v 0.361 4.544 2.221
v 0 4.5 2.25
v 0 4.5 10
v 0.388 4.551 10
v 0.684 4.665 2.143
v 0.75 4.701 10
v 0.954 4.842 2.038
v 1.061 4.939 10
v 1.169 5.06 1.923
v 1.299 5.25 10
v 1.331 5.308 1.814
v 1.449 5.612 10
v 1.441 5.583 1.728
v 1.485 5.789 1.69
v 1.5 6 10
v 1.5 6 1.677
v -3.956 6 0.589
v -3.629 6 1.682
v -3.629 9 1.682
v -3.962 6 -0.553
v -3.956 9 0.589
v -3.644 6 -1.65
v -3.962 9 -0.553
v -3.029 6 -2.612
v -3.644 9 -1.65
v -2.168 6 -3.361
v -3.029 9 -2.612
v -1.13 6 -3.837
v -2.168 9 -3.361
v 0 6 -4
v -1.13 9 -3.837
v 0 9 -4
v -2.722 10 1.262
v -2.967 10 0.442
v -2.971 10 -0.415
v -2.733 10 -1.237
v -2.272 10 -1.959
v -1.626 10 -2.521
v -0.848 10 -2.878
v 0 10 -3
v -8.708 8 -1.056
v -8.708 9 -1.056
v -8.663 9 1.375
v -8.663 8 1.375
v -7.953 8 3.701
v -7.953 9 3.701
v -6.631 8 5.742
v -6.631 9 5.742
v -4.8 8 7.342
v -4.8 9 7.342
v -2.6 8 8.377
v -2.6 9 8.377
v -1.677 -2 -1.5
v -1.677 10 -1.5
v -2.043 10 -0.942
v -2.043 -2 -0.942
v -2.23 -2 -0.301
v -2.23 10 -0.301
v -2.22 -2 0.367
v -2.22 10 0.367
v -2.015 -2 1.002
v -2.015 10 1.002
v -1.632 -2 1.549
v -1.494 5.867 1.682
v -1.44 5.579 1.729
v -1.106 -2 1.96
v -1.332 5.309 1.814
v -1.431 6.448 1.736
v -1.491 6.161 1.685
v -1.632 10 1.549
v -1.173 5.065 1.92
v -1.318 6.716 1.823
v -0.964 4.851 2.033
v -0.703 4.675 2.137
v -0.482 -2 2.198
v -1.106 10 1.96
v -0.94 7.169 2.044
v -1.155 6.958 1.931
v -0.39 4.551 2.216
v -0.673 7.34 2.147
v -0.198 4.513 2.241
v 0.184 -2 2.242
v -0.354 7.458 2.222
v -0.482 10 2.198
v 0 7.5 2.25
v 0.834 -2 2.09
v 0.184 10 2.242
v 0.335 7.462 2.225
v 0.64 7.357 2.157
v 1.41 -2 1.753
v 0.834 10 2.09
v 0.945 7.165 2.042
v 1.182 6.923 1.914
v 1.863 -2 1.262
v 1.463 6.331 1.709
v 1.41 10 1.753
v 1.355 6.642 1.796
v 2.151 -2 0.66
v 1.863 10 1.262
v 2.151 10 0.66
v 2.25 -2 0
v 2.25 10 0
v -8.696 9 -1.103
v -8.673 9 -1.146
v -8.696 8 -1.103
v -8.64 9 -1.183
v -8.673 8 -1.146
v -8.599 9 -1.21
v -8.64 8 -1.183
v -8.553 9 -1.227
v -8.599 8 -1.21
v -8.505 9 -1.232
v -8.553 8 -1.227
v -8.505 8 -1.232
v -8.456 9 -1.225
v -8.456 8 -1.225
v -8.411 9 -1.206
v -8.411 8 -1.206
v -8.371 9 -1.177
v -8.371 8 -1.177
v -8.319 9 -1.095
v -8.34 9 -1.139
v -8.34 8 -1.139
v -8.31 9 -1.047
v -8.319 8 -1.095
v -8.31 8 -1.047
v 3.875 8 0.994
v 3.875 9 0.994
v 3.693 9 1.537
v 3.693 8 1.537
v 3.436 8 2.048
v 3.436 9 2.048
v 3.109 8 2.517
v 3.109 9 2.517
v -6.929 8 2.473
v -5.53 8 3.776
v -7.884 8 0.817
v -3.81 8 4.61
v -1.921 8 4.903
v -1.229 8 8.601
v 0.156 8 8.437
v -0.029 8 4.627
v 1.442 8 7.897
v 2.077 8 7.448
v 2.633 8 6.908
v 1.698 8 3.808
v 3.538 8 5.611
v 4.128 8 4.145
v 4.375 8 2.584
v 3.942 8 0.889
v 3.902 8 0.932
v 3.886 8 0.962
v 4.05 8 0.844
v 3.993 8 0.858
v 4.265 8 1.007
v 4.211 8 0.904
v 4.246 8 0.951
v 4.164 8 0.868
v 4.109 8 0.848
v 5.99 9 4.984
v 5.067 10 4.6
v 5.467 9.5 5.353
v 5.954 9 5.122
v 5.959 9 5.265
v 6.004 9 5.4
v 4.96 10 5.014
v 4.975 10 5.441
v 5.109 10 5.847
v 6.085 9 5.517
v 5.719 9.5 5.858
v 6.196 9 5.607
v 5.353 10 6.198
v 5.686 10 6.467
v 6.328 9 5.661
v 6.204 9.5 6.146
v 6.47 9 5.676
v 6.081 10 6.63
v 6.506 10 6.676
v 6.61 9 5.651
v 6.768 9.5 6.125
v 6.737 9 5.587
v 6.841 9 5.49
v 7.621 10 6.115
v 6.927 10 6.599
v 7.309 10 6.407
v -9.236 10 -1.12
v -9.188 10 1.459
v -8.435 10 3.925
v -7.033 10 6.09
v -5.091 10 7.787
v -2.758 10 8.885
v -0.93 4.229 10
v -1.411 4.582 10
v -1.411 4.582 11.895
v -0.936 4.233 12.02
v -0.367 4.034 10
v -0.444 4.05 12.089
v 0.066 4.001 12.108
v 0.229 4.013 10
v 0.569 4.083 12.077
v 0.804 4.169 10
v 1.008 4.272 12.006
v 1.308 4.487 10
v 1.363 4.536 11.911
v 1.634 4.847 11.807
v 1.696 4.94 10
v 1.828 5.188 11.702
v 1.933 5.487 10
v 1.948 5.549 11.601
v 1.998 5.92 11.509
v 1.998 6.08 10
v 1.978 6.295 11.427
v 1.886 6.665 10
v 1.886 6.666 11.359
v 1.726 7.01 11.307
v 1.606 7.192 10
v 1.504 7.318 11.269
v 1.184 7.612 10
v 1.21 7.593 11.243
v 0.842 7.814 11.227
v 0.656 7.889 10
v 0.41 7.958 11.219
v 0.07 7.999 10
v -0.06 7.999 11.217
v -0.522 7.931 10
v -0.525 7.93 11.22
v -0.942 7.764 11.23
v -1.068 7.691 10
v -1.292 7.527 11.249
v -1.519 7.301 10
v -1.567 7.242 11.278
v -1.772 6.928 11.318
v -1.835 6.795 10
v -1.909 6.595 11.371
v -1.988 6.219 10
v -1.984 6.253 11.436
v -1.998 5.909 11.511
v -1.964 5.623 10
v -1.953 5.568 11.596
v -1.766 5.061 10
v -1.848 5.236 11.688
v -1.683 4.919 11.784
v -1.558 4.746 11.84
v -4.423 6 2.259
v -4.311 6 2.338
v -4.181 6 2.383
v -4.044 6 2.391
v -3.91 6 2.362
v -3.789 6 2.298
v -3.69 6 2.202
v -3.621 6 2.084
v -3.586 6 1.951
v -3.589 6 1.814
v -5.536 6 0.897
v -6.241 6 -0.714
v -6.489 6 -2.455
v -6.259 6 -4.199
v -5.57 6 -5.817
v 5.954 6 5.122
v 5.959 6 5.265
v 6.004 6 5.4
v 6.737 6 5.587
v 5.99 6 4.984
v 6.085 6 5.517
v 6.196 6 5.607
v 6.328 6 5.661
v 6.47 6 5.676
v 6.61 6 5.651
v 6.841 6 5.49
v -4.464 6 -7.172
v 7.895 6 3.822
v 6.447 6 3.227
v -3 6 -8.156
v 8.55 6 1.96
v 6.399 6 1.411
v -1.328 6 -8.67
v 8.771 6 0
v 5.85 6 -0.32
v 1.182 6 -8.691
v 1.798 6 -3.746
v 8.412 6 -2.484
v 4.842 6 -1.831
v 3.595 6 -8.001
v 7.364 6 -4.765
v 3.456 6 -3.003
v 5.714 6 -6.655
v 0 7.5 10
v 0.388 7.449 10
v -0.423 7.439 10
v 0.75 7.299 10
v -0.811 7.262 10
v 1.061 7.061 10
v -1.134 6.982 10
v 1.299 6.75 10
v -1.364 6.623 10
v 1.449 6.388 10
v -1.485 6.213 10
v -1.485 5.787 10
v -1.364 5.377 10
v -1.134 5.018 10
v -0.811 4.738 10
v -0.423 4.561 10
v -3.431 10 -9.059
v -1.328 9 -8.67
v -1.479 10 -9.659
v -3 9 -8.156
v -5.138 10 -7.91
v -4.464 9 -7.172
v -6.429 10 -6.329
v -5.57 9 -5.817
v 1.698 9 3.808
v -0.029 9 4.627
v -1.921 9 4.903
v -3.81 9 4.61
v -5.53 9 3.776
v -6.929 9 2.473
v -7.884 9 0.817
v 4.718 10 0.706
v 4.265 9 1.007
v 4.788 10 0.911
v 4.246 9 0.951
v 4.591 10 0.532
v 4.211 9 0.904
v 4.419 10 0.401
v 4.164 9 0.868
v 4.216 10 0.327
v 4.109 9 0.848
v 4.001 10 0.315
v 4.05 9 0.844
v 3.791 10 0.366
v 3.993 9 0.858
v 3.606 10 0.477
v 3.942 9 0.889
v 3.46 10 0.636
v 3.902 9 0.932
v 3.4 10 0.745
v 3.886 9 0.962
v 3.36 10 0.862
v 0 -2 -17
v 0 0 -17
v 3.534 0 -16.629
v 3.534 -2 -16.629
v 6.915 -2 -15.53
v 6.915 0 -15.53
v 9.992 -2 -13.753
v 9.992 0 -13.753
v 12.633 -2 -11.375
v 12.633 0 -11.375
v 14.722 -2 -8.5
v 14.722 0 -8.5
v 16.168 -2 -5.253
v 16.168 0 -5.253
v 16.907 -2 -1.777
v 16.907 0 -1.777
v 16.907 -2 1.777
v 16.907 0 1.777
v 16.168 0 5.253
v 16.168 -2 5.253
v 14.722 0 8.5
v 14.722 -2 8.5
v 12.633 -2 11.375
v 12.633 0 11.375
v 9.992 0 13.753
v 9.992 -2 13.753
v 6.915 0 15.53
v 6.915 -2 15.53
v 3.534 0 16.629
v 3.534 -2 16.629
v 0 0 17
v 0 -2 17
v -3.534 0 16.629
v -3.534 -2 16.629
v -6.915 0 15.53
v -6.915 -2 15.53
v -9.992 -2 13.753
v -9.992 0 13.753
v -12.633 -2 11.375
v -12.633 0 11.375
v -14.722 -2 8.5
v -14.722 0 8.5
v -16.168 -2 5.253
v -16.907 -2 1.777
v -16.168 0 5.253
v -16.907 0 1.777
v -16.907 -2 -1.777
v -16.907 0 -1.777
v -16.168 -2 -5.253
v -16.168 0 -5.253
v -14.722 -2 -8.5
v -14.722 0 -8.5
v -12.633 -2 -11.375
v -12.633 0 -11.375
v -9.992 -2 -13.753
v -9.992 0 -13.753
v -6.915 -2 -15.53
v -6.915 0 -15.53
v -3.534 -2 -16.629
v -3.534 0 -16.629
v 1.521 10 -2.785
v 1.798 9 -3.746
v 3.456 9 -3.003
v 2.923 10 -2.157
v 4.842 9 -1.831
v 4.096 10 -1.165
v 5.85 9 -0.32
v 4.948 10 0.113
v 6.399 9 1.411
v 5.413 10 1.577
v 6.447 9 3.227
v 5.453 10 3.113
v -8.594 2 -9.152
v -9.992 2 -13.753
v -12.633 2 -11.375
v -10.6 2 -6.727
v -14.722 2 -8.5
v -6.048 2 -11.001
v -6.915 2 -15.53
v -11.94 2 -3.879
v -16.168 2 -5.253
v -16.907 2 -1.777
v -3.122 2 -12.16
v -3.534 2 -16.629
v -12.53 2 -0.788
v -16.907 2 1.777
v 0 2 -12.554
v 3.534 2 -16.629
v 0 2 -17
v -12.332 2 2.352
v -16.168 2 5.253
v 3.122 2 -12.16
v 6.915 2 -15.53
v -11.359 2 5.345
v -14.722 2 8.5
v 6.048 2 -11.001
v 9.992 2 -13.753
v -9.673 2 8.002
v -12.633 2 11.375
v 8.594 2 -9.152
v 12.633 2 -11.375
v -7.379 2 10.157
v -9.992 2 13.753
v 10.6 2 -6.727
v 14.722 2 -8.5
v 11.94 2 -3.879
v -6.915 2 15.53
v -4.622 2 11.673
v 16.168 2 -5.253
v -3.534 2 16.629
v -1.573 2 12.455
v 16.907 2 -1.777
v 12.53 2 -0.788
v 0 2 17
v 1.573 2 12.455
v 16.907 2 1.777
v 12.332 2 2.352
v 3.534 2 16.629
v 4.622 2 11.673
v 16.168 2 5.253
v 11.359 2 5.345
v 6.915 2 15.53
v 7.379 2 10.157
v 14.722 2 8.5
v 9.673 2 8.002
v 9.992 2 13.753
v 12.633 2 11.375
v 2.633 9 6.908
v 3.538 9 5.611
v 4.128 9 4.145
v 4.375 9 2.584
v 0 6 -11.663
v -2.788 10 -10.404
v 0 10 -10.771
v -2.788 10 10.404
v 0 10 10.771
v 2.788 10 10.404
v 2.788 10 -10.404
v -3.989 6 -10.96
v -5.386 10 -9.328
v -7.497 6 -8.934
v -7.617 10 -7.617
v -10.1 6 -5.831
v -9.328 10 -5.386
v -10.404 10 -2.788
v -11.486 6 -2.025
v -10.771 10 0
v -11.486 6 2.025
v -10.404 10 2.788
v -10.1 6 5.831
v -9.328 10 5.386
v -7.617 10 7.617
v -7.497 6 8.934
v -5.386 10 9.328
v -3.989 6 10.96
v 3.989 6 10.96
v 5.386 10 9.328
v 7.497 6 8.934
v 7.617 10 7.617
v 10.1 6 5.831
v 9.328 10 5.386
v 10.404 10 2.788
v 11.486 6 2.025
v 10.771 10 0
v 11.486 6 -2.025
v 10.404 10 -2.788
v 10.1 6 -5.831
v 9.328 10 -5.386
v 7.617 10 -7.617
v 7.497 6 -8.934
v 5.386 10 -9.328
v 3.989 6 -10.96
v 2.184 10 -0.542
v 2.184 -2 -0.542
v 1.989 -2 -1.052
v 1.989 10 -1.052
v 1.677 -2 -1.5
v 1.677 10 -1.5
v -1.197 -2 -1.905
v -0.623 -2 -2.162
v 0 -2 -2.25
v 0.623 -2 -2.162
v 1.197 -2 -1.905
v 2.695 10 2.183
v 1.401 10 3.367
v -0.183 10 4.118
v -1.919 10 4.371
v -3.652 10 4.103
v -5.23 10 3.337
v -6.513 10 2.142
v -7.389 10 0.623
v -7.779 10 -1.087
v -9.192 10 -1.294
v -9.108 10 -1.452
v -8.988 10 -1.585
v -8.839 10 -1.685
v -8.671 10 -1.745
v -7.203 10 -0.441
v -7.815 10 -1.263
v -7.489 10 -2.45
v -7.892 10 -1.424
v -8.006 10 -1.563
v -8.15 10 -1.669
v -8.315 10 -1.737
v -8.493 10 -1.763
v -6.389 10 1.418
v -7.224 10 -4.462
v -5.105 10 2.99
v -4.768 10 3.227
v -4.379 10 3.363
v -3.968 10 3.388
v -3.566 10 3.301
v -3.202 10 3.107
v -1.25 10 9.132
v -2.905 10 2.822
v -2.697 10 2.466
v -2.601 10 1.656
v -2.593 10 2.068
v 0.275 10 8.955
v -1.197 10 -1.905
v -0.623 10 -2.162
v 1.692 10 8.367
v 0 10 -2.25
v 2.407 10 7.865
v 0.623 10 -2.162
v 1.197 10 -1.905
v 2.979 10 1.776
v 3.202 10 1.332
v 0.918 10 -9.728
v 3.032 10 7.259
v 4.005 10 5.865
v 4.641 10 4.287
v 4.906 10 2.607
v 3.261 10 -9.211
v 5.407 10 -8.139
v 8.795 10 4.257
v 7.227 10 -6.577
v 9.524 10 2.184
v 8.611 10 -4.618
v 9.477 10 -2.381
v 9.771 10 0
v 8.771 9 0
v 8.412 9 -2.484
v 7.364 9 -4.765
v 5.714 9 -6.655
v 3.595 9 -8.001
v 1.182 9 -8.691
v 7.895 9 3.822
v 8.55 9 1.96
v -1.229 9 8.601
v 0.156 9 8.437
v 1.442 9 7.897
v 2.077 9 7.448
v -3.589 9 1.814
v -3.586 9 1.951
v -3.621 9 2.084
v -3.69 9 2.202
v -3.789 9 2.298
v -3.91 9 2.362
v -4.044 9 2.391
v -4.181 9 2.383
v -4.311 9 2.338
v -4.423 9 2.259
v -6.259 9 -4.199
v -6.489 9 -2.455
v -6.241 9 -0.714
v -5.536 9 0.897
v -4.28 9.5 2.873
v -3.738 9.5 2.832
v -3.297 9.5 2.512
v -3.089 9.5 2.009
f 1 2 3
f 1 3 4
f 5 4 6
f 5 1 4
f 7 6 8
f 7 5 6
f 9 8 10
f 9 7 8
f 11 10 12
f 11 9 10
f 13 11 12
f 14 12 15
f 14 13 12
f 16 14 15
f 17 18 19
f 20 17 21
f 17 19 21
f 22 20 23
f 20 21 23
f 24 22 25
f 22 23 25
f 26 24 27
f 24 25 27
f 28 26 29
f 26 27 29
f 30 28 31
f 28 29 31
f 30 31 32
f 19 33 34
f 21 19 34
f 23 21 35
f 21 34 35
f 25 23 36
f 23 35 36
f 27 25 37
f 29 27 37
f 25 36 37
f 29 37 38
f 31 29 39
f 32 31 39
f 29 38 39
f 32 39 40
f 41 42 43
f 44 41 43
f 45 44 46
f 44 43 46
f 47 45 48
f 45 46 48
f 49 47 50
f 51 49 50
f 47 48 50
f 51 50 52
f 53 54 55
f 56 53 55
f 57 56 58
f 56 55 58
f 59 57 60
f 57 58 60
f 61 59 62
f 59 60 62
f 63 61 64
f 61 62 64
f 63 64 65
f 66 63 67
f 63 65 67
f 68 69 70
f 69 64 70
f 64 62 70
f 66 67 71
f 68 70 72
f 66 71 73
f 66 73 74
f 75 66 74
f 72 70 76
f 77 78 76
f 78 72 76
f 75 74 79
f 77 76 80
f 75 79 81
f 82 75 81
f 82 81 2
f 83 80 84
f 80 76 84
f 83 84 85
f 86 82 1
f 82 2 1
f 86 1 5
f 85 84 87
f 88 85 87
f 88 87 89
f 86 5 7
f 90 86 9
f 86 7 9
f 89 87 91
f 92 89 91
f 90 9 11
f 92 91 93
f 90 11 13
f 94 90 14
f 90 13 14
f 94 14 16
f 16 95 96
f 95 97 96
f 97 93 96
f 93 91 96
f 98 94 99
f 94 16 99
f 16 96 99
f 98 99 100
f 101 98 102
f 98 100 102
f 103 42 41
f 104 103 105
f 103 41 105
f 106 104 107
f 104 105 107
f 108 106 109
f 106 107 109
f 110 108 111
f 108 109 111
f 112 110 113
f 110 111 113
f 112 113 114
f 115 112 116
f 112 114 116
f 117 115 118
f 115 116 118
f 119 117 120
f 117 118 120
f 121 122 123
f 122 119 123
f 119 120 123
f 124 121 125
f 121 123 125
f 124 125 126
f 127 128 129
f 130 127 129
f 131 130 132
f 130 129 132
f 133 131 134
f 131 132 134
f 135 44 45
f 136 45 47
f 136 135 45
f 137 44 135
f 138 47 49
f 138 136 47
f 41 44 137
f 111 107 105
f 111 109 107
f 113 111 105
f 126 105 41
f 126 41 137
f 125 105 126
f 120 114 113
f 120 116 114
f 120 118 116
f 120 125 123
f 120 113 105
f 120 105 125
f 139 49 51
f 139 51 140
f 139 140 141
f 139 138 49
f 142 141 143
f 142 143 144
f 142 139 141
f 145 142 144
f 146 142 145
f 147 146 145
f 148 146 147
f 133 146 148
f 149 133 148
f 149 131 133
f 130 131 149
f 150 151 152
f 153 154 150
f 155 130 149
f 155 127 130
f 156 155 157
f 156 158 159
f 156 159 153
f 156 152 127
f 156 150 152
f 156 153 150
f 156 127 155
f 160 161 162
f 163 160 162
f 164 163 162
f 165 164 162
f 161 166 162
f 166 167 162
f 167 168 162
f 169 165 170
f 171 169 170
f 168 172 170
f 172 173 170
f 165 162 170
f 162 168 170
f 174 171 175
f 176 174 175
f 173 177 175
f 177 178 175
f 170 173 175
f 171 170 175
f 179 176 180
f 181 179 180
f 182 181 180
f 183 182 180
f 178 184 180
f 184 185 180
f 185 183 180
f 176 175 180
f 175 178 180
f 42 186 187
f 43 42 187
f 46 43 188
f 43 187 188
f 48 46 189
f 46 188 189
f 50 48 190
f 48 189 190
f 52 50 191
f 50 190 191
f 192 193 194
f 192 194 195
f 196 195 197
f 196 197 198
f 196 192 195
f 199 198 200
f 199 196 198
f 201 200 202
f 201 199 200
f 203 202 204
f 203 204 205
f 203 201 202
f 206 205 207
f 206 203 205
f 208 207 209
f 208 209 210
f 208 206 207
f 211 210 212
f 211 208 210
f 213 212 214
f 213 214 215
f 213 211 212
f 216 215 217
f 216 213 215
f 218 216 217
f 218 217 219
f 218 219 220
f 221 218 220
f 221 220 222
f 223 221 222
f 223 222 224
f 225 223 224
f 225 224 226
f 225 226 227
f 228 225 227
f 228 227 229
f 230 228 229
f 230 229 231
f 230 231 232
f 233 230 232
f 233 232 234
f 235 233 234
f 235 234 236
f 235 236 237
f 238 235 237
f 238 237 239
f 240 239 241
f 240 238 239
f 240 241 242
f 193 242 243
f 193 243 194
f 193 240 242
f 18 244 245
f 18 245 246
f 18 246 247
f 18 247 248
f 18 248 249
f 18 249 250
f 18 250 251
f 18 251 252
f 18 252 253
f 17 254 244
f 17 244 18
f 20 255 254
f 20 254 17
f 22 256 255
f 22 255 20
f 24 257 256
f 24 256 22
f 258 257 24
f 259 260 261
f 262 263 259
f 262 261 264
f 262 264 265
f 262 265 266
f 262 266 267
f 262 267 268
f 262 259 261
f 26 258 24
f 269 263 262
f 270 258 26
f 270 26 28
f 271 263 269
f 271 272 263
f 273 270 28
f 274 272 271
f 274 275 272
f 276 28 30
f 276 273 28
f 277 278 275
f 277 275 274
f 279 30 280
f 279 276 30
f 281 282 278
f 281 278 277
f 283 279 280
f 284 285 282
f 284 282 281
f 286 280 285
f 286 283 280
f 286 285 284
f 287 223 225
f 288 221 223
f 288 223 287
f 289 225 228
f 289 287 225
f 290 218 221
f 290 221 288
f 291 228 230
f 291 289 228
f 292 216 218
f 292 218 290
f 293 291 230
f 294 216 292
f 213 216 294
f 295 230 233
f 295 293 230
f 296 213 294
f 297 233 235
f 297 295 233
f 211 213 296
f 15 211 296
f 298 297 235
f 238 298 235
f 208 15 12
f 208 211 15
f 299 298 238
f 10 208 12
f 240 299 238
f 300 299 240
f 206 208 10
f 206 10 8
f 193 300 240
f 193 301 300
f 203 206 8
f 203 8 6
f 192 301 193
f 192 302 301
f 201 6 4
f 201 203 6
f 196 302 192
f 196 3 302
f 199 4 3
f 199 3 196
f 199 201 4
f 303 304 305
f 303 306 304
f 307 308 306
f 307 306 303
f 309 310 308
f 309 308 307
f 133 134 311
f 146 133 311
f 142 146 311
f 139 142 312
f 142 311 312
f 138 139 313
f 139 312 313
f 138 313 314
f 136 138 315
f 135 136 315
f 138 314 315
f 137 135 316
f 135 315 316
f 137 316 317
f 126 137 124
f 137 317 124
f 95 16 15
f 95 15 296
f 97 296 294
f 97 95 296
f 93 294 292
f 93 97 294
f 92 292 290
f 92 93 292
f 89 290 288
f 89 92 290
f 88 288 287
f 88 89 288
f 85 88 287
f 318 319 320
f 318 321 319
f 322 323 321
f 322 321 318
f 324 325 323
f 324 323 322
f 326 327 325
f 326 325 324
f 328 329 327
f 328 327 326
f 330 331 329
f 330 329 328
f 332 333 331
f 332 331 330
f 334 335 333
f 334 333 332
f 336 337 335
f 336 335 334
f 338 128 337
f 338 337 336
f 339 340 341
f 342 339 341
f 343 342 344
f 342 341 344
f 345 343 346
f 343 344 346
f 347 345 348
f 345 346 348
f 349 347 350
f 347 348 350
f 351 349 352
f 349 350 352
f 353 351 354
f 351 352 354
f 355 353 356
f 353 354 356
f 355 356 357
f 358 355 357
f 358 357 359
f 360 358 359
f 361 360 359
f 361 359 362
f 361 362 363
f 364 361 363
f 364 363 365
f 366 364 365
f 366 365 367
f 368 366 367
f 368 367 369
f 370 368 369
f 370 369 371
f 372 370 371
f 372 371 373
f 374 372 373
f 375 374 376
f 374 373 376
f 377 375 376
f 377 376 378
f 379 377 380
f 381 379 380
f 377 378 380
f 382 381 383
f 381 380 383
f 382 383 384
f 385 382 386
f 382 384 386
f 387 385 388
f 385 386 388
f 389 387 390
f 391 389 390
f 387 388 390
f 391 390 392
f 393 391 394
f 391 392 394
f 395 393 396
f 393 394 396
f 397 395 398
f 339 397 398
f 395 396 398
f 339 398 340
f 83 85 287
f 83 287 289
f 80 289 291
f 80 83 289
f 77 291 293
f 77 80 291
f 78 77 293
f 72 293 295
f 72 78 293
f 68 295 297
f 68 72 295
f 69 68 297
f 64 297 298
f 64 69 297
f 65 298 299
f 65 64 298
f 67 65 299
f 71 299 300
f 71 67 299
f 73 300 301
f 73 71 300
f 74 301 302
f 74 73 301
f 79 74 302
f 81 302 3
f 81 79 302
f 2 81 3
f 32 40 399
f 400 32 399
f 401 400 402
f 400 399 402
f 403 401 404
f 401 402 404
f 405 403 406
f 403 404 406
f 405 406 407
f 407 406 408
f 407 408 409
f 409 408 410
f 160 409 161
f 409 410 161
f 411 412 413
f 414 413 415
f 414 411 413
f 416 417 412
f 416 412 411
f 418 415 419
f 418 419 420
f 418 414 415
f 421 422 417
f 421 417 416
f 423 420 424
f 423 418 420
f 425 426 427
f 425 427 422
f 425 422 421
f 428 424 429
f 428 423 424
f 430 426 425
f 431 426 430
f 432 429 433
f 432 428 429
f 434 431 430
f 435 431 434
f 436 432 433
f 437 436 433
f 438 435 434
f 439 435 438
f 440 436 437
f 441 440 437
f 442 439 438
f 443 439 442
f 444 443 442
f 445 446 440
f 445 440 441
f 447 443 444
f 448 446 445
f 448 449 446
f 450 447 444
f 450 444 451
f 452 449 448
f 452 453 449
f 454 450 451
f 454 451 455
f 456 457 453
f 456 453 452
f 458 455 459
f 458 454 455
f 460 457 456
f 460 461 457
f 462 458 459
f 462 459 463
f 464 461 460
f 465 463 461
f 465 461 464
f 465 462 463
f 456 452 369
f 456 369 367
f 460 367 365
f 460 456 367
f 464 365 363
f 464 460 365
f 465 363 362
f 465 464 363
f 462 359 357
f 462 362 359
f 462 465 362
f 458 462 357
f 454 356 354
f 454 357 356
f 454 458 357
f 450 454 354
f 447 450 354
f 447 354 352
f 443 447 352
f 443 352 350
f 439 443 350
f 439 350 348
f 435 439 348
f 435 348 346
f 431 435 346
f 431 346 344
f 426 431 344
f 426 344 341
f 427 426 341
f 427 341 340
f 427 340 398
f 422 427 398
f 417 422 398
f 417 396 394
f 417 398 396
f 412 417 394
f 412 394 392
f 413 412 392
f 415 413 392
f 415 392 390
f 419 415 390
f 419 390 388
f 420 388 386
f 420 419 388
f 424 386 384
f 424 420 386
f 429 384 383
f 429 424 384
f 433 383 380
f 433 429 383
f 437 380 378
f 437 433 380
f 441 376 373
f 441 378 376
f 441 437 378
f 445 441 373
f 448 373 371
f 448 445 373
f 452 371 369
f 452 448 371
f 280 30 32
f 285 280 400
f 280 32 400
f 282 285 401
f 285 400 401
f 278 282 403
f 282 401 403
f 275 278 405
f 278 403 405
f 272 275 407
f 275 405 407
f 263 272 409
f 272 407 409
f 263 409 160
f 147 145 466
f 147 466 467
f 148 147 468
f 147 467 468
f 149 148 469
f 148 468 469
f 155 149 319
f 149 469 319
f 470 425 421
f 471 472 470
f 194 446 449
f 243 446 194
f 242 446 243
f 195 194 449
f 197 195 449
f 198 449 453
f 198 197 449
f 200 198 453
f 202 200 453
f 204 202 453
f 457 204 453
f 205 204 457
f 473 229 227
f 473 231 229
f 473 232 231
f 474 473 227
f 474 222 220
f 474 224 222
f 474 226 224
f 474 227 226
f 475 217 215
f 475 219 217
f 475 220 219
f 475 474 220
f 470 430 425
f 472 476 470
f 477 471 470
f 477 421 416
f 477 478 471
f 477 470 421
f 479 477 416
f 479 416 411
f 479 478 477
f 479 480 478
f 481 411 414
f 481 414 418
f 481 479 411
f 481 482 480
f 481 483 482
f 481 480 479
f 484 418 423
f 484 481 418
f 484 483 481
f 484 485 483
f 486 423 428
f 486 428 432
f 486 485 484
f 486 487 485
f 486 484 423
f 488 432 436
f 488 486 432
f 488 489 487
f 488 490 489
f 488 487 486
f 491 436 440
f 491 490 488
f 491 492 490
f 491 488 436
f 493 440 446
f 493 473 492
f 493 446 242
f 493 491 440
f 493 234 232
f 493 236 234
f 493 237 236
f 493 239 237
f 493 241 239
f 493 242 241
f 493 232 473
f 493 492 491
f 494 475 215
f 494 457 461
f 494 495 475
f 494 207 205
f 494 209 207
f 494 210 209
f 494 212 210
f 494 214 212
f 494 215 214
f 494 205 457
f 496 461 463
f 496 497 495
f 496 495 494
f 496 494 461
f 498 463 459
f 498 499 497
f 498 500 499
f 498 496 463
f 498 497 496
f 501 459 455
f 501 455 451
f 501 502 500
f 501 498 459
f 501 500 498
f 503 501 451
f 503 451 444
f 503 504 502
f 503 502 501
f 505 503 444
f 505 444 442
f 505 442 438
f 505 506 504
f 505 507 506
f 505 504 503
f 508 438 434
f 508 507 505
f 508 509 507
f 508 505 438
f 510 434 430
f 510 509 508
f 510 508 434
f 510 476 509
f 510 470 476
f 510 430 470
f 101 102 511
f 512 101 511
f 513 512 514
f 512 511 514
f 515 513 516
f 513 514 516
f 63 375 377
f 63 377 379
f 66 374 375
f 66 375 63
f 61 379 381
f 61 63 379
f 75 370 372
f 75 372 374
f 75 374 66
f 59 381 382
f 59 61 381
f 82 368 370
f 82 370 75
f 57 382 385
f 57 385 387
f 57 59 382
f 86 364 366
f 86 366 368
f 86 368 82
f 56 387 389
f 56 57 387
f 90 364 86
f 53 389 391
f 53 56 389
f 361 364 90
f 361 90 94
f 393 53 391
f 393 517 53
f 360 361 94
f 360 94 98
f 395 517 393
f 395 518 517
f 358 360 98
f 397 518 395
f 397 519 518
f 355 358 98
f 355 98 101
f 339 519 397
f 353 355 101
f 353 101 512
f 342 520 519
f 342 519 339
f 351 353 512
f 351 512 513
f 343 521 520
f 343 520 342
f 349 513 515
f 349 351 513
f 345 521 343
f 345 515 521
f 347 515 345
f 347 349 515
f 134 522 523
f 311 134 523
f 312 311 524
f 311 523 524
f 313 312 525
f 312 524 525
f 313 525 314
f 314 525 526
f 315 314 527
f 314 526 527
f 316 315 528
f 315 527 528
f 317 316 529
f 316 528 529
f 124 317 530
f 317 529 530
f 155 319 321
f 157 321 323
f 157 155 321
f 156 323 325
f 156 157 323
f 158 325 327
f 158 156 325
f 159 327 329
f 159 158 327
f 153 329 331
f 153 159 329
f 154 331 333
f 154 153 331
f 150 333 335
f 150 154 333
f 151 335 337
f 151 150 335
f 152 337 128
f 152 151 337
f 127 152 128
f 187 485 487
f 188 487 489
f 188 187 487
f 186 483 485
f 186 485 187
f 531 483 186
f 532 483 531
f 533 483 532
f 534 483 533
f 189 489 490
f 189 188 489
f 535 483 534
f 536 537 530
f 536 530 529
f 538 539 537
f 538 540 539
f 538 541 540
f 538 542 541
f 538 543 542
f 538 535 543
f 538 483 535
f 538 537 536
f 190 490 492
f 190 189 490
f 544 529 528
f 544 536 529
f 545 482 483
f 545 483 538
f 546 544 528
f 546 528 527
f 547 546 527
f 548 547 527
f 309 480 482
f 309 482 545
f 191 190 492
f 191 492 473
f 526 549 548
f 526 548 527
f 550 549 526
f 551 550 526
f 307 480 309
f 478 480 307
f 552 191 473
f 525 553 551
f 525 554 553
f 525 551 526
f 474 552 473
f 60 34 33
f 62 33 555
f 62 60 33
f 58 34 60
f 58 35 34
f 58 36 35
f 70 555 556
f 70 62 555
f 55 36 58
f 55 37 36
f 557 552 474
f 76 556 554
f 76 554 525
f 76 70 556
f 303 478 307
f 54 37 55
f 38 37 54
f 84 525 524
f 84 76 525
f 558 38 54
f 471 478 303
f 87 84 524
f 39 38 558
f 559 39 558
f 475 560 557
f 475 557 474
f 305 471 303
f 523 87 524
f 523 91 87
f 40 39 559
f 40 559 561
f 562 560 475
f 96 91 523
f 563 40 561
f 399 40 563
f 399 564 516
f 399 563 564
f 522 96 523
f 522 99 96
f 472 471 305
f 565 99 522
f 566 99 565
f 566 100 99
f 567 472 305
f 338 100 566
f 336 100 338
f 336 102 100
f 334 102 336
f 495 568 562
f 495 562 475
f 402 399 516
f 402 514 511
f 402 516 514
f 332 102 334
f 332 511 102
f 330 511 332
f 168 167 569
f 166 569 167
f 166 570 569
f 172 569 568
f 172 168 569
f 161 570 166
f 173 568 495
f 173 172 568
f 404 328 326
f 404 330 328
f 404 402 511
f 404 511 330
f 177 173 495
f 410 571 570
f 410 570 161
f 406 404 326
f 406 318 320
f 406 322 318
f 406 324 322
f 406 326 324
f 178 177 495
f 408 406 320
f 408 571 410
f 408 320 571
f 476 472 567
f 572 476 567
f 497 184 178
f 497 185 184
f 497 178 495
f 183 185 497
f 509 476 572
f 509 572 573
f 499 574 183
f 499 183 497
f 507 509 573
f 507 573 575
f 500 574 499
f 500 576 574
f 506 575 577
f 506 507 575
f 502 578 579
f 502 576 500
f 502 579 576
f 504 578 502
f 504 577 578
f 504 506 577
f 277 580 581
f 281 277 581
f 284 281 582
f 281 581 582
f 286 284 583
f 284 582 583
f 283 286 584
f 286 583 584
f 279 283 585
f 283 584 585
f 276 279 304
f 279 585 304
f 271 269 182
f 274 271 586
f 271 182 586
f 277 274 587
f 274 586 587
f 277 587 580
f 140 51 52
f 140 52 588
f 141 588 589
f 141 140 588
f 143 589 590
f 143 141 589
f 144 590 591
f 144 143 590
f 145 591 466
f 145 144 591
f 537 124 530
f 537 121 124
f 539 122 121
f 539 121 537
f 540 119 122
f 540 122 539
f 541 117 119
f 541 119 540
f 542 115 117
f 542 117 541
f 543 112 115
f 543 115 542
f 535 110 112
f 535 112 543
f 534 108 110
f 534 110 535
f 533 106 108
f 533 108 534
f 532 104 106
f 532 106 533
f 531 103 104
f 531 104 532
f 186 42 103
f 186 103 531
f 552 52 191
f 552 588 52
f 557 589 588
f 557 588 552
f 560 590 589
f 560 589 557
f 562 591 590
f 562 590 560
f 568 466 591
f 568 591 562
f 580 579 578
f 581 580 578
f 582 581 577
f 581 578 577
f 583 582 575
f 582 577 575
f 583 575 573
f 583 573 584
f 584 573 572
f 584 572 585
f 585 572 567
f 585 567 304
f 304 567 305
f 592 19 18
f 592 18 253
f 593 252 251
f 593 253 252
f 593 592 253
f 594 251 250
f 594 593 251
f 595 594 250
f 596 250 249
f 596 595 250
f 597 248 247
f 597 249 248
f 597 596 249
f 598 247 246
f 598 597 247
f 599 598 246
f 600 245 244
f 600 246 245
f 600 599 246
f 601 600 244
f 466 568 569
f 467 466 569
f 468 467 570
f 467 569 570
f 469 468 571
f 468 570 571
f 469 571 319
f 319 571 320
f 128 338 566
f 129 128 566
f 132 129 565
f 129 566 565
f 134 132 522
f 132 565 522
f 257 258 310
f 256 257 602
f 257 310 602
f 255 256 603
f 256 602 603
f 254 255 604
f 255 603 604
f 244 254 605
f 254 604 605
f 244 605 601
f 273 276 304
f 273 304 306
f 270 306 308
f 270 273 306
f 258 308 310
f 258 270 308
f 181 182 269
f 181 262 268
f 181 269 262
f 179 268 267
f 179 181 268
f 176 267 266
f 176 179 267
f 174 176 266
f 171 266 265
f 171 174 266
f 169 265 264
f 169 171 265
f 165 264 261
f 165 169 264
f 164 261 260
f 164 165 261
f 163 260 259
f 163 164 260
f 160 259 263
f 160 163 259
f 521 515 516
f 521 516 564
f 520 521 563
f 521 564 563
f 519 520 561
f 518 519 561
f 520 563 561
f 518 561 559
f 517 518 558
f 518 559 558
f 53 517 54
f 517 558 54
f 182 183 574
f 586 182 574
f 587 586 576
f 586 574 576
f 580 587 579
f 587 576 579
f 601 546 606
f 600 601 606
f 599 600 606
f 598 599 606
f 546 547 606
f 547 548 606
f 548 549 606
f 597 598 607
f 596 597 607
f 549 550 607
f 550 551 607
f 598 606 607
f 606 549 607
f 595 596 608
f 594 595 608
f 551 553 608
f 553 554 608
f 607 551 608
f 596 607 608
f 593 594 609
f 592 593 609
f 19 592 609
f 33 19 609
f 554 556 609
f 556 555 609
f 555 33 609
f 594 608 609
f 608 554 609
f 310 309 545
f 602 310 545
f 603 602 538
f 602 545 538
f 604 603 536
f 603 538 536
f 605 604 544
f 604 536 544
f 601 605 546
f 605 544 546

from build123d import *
from OCP.BRepFilletAPI import BRepFilletAPI_MakeChamfer

# Parameters (mm, degrees)
SKETCH1_R               = 13
BOSS_EXTRUDE1_DEPTH     = 10
SKETCH3_R               = 17
BOSS_EXTRUDE2_DEPTH     = 2
F_4_MM_SHAFT_HOLE_DEPTH = 27.870057685
BOSS_EXTRUDE3_START     = 2
SKETCH9_R               = 17
SKETCH9_R_2             = 2.25
BOSS_EXTRUDE3_DEPTH     = 2
CUT_EXTRUDE3_DEPTH      = 27.038433133
CUT_EXTRUDE4_START      = 10
SKETCH10_3_R            = 2
SKETCH10_3_R_2          = 1.5
CUT_EXTRUDE4_DEPTH      = 17.038433171
CUT_EXTRUDE5_DEPTH      = 4
FILLET3_R               = 6
FILLET4_R               = 0.5
CHAMFER1_SIZE           = 1
CUT_EXTRUDE7_DEPTH      = 2
FILLET6_R               = 5
FILLET8_R               = 0.2
CHAMFER3_SIZE           = 1
CHAMFER3_SIZE2          = 0.531709432


with BuildPart() as part:
    # Sketch1 → Boss-Extrude1 (new body)
    with BuildSketch(Plane(origin=(0, 0, 0), x_dir=(1, 0, 0), z_dir=(0, 1, 0))):
        with Locations(Location((0, 0, 0), (0, 0, 270))):
            Circle(SKETCH1_R)
    extrude(amount=BOSS_EXTRUDE1_DEPTH)

    # Sketch2 → Cut-Revolve1 (revolve, cut)
    with BuildSketch(Plane(origin=(0, 0, 0), x_dir=(0, 0, -1), z_dir=(1, 0, 0)), mode=Mode.PRIVATE) as cut_revolve1_sk:
        Polygon((-13, 0), (-10.771428571, 10), (-13, 10), align=None)
    revolve(cut_revolve1_sk.sketch.rotate(Axis((0, 0, 0), (0, 1, 0)), 180), axis=Axis((0, 0, 0), (0, 1, 0)), mode=Mode.SUBTRACT)

    # Sketch3 → Boss-Extrude2 (add)
    with BuildSketch(Plane(origin=(0, 0, 0), x_dir=(-1, 0, 0), z_dir=(0, -1, 0))):
        with Locations(Location((0, 0, 0), (0, 0, 90))):
            Circle(SKETCH3_R)
    extrude(amount=BOSS_EXTRUDE2_DEPTH)

    # Sketch5 → 4-mm shaft hole (cut, through all)
    with BuildSketch(Plane(origin=(0, 10, 0), x_dir=(1, 0, 0), z_dir=(0, 1, 0))):
        with BuildLine():
            ThreePointArc((1.677050983, 1.5), (0, 2.25), (-1.677050983, 1.5))
            Line((-1.677050983, 1.5), (1.677050983, 1.5))
        make_face()
        with BuildLine():
            Line((1.677050983, 1.5), (-1.677050983, 1.5))
            ThreePointArc((-1.677050983, 1.5), (-0.802849702, -2.101887808), (2.25, 0))
            ThreePointArc((2.25, 0), (2.101887808, 0.802849702), (1.677050983, 1.5))
        make_face()
    extrude(amount=-F_4_MM_SHAFT_HOLE_DEPTH, mode=Mode.SUBTRACT)

    # Sketch9 → Boss-Extrude3 (add)
    with BuildSketch(Plane(origin=(0, 0, 0), x_dir=(1, 0, 0), z_dir=(0, 1, 0)).offset(BOSS_EXTRUDE3_START)):
        with Locations(Location((0, 0, 0), (0, 0, 270))):
            Circle(SKETCH9_R)
        with Locations(Location((0, 0, 0), (0, 0, 270))):
            Circle(SKETCH9_R_2, mode=Mode.SUBTRACT)
    extrude(amount=-BOSS_EXTRUDE3_DEPTH)

    # Sketch10 → Cut-Extrude3 (cut, through all)
    with BuildSketch(Plane.XY):
        with BuildLine():
            ThreePointArc((0, 7.5), (-1.5, 6), (0, 4.5))
            Line((0, 4.5), (0, 7.5))
        make_face()
        with BuildLine():
            Line((0, 7.5), (0, 4.5))
            ThreePointArc((0, 4.5), (1.060660172, 4.939339828), (1.5, 6))
            ThreePointArc((1.5, 6), (1.060660172, 7.060660172), (0, 7.5))
        make_face()
    extrude(amount=CUT_EXTRUDE3_DEPTH, mode=Mode.SUBTRACT)

    # Sketch10<3> → Cut-Extrude4 (cut, through all)
    with BuildSketch(Plane.XY.offset(CUT_EXTRUDE4_START)):
        with Locations(Location((0, 6, 0), (0, 0, 225.143578884))):
            Circle(SKETCH10_3_R)
        with Locations(Location((0, 6, 0), (0, 0, 270))):
            Circle(SKETCH10_3_R_2, mode=Mode.SUBTRACT)
    extrude(amount=CUT_EXTRUDE4_DEPTH, mode=Mode.SUBTRACT)

    # Sketch11 → Cut-Extrude5 (cut)
    with BuildSketch(Plane(origin=(0, 10, 0), x_dir=(1, 0, 0), z_dir=(0, 1, 0))):
        with BuildLine():
            ThreePointArc((3, -8.242448615), (7.185132041, -5.031087033), (8.771428571, 0))
            ThreePointArc((8.771428571, 0), (5.031087033, 7.185132041), (-3, 8.242448615))
            ThreePointArc((-3, 8.242448615), (-6.302331872, 0.944417603), (0, -4))
            ThreePointArc((0, -4), (-4, 0), (0, 4))
            ThreePointArc((0, 4), (6.302331872, -0.944417603), (3, -8.242448615))
        make_face()
    extrude(amount=-CUT_EXTRUDE5_DEPTH, mode=Mode.SUBTRACT)

    # Fillet3
    fillet3_edges = [part.edges().sort_by_distance(p)[0] for p in [
        (-3, 8, -8.242448615),
    ]]
    fillet(fillet3_edges, radius=FILLET3_R)

    # Fillet4
    # the kernel refuses this fillet: 0.5 mm, written as the material it adds along each edge
    with BuildSketch(Plane(origin=(3, 10, 8.242448615), x_dir=(0.676109910174844, 0, -0.7368007799692969), z_dir=(0, -1, 0))) as fillet4_piece_1_section:
        with BuildLine():
            CenterArc((4.592297125, 0.470079575), FILLET4_R, 86.204134404, 163.874166307)
            ThreePointArc((4.625398075, 0.968982699), (2.246212442, 0.801862309), (0, 0))
            ThreePointArc((0, 0), (2.210964653, 0.38829518), (4.421929307, 0))
        make_face()
    fillet4_piece_1 = extrude(amount=15.814513008, mode=Mode.PRIVATE)
    fillet4_piece_1 = split(fillet4_piece_1, bisect_by=Plane(origin=(5.361441464, -2, 6.517574012), z_dir=(0, 1, 0)), keep=Keep.TOP, mode=Mode.PRIVATE)
    add(fillet4_piece_1)
    with BuildSketch(Plane(origin=(0, 10, 4), x_dir=(-0.8427994583990877, 0, -0.5382277147473964), z_dir=(0, -1, 0))) as fillet4_piece_2_section:
        with BuildLine():
            CenterArc((4.574935575, -0.421399729), FILLET4_R, 122.563073018, 157.850467981)
            ThreePointArc((4.665311372, -0.913164119), (2.246019142, -0.899203979), (0, 0))
            ThreePointArc((0, 0), (2.152910859, -0.628802166), (4.305821718, 0))
        make_face()
    fillet4_piece_2 = extrude(amount=14.384601093, mode=Mode.PRIVATE)
    fillet4_piece_2 = fillet4_piece_2 - Plane(origin=(0, 6, 2.911656579), x_dir=(0, 1, 0), z_dir=(0, 0, -1)) * Cylinder(1.5, 48, mode=Mode.PRIVATE)
    fillet4_piece_2 = split(fillet4_piece_2, bisect_by=Plane(origin=(-3.011239117, -2, 2.911656579), z_dir=(0, 1, 0)), keep=Keep.TOP, mode=Mode.PRIVATE)
    add(fillet4_piece_2)

    # Chamfer1
    chamfer1_edges = [part.edges().sort_by_distance(p)[0] for p in [
        (-3.371197834, 10, -2.152910859),
        (5.398969594, 10, -1.110594427),
        (-3.768481471, 10, -7.717945042),
        (7.597652385, 10, -4.383336334),
        (-6.424305098, 10, -1.576218344),
        (6.196119079, 10, 5.606673983),
        (-3.789032474, 10, 2.297570227),
    ]]
    chamfer(chamfer1_edges, length=CHAMFER1_SIZE)

    # Sketch14 → Cut-Extrude7 (cut)
    with BuildSketch(Plane(origin=(0, 10, 0), x_dir=(1, 0, 0), z_dir=(0, 1, 0))):
        with BuildLine():
            ThreePointArc((3.108583846, -2.517281564), (-5.049231929, -4.075420571), (-7.949614017, 3.706965896))
            ThreePointArc((-7.949614017, 3.706965896), (-7.397747824, -4.712885136), (0, -8.771428571))
            ThreePointArc((0, -8.771428571), (3.750591207, -5.184029494), (4, 0))
            ThreePointArc((4, 0), (3.770565964, -1.335227437), (3.108583846, -2.517281564))
        make_face()
    extrude(amount=-CUT_EXTRUDE7_DEPTH, mode=Mode.SUBTRACT)

    # Fillet6
    fillet6_edges = [part.edges().sort_by_distance(p)[0] for p in [
        (0, 9, 8.771428571),
    ]]
    fillet(fillet6_edges, radius=FILLET6_R)

    # Fillet8
    fillet8_edges = [part.edges().sort_by_distance(p)[0] for p in [
        (4, 9, 0),
        (-7.949614017, 9, -3.706965896),
    ]]
    fillet(fillet8_edges, radius=FILLET8_R)

    # Chamfer3: one chamfer whose edges measure the first distance from different faces: ONE call of the kernel's chamfer builder (chamfer() names one face for all edges)
    chamfer3_edges_1 = [part.edges().sort_by_distance(p)[0] for p in [
        (3.573698882, 10, 1.796851775),
    ]]
    chamfer3_side_1 = [part.faces().sort_by_distance(p)[0] for p in [
        (3.573698882, 9, 1.796851775),
    ]]
    chamfer3_edges_2 = [part.edges().sort_by_distance(p)[0] for p in [
        (-3.810129446, 10, 4.610453161),
    ]]
    chamfer3_side_2 = [part.faces().sort_by_distance(p)[0] for p in [
        (-3.810129446, 9, 4.610453161),
    ]]
    chamfer3_edges_3 = [part.edges().sort_by_distance(p)[0] for p in [
        (0.233729709, 10, 8.415761951),
    ]]
    chamfer3_side_3 = [part.faces().sort_by_distance(p)[0] for p in [
        (0.233729709, 9, 8.415761951),
    ]]
    chamfer3_edges_4 = [part.edges().sort_by_distance(p)[0] for p in [
        (-7.362823163, 10, 4.767262763),
    ]]
    chamfer3_side_4 = [part.faces().sort_by_distance(p)[0] for p in [
        (-7.362823163, 9, 4.767262763),
    ]]
    chamfer3_edges_5 = [part.edges().sort_by_distance(p)[0] for p in [
        (4.128369515, 10, 4.145305416),
    ]]
    chamfer3_side_5 = [part.faces().sort_by_distance(p)[0] for p in [
        (4.128369515, 9, 4.145305416),
    ]]
    chamfer3_edges_6 = [part.edges().sort_by_distance(p)[0] for p in [
        (-8.504611001, 10, -1.231596345),
    ]]
    chamfer3_side_6 = [part.faces().sort_by_distance(p)[0] for p in [
        (-8.504611001, 9, -1.231596345),
    ]]
    chamfer3_edges_7 = [part.edges().sort_by_distance(p)[0] for p in [
        (4.075125782, 10, 0.843648275),
    ]]
    chamfer3_side_7 = [part.faces().sort_by_distance(p)[0] for p in [
        (4.075125783, 9, 0.843648274),
    ]]
    chamfer3 = BRepFilletAPI_MakeChamfer(part.part.solid().wrapped)
    for e in chamfer3_edges_1:
        chamfer3.Add(CHAMFER3_SIZE, CHAMFER3_SIZE2, e.wrapped, chamfer3_side_1[0].wrapped)  # the first distance lies on this face
    for e in chamfer3_edges_2:
        chamfer3.Add(CHAMFER3_SIZE, CHAMFER3_SIZE2, e.wrapped, chamfer3_side_2[0].wrapped)  # the first distance lies on this face
    for e in chamfer3_edges_3:
        chamfer3.Add(CHAMFER3_SIZE, CHAMFER3_SIZE2, e.wrapped, chamfer3_side_3[0].wrapped)  # the first distance lies on this face
    for e in chamfer3_edges_4:
        chamfer3.Add(CHAMFER3_SIZE, CHAMFER3_SIZE2, e.wrapped, chamfer3_side_4[0].wrapped)  # the first distance lies on this face
    for e in chamfer3_edges_5:
        chamfer3.Add(CHAMFER3_SIZE, CHAMFER3_SIZE2, e.wrapped, chamfer3_side_5[0].wrapped)  # the first distance lies on this face
    for e in chamfer3_edges_6:
        chamfer3.Add(CHAMFER3_SIZE, CHAMFER3_SIZE2, e.wrapped, chamfer3_side_6[0].wrapped)  # the first distance lies on this face
    for e in chamfer3_edges_7:
        chamfer3.Add(CHAMFER3_SIZE, CHAMFER3_SIZE2, e.wrapped, chamfer3_side_7[0].wrapped)  # the first distance lies on this face
    add(Compound.cast(chamfer3.Shape()), mode=Mode.REPLACE)


solid = part.part
